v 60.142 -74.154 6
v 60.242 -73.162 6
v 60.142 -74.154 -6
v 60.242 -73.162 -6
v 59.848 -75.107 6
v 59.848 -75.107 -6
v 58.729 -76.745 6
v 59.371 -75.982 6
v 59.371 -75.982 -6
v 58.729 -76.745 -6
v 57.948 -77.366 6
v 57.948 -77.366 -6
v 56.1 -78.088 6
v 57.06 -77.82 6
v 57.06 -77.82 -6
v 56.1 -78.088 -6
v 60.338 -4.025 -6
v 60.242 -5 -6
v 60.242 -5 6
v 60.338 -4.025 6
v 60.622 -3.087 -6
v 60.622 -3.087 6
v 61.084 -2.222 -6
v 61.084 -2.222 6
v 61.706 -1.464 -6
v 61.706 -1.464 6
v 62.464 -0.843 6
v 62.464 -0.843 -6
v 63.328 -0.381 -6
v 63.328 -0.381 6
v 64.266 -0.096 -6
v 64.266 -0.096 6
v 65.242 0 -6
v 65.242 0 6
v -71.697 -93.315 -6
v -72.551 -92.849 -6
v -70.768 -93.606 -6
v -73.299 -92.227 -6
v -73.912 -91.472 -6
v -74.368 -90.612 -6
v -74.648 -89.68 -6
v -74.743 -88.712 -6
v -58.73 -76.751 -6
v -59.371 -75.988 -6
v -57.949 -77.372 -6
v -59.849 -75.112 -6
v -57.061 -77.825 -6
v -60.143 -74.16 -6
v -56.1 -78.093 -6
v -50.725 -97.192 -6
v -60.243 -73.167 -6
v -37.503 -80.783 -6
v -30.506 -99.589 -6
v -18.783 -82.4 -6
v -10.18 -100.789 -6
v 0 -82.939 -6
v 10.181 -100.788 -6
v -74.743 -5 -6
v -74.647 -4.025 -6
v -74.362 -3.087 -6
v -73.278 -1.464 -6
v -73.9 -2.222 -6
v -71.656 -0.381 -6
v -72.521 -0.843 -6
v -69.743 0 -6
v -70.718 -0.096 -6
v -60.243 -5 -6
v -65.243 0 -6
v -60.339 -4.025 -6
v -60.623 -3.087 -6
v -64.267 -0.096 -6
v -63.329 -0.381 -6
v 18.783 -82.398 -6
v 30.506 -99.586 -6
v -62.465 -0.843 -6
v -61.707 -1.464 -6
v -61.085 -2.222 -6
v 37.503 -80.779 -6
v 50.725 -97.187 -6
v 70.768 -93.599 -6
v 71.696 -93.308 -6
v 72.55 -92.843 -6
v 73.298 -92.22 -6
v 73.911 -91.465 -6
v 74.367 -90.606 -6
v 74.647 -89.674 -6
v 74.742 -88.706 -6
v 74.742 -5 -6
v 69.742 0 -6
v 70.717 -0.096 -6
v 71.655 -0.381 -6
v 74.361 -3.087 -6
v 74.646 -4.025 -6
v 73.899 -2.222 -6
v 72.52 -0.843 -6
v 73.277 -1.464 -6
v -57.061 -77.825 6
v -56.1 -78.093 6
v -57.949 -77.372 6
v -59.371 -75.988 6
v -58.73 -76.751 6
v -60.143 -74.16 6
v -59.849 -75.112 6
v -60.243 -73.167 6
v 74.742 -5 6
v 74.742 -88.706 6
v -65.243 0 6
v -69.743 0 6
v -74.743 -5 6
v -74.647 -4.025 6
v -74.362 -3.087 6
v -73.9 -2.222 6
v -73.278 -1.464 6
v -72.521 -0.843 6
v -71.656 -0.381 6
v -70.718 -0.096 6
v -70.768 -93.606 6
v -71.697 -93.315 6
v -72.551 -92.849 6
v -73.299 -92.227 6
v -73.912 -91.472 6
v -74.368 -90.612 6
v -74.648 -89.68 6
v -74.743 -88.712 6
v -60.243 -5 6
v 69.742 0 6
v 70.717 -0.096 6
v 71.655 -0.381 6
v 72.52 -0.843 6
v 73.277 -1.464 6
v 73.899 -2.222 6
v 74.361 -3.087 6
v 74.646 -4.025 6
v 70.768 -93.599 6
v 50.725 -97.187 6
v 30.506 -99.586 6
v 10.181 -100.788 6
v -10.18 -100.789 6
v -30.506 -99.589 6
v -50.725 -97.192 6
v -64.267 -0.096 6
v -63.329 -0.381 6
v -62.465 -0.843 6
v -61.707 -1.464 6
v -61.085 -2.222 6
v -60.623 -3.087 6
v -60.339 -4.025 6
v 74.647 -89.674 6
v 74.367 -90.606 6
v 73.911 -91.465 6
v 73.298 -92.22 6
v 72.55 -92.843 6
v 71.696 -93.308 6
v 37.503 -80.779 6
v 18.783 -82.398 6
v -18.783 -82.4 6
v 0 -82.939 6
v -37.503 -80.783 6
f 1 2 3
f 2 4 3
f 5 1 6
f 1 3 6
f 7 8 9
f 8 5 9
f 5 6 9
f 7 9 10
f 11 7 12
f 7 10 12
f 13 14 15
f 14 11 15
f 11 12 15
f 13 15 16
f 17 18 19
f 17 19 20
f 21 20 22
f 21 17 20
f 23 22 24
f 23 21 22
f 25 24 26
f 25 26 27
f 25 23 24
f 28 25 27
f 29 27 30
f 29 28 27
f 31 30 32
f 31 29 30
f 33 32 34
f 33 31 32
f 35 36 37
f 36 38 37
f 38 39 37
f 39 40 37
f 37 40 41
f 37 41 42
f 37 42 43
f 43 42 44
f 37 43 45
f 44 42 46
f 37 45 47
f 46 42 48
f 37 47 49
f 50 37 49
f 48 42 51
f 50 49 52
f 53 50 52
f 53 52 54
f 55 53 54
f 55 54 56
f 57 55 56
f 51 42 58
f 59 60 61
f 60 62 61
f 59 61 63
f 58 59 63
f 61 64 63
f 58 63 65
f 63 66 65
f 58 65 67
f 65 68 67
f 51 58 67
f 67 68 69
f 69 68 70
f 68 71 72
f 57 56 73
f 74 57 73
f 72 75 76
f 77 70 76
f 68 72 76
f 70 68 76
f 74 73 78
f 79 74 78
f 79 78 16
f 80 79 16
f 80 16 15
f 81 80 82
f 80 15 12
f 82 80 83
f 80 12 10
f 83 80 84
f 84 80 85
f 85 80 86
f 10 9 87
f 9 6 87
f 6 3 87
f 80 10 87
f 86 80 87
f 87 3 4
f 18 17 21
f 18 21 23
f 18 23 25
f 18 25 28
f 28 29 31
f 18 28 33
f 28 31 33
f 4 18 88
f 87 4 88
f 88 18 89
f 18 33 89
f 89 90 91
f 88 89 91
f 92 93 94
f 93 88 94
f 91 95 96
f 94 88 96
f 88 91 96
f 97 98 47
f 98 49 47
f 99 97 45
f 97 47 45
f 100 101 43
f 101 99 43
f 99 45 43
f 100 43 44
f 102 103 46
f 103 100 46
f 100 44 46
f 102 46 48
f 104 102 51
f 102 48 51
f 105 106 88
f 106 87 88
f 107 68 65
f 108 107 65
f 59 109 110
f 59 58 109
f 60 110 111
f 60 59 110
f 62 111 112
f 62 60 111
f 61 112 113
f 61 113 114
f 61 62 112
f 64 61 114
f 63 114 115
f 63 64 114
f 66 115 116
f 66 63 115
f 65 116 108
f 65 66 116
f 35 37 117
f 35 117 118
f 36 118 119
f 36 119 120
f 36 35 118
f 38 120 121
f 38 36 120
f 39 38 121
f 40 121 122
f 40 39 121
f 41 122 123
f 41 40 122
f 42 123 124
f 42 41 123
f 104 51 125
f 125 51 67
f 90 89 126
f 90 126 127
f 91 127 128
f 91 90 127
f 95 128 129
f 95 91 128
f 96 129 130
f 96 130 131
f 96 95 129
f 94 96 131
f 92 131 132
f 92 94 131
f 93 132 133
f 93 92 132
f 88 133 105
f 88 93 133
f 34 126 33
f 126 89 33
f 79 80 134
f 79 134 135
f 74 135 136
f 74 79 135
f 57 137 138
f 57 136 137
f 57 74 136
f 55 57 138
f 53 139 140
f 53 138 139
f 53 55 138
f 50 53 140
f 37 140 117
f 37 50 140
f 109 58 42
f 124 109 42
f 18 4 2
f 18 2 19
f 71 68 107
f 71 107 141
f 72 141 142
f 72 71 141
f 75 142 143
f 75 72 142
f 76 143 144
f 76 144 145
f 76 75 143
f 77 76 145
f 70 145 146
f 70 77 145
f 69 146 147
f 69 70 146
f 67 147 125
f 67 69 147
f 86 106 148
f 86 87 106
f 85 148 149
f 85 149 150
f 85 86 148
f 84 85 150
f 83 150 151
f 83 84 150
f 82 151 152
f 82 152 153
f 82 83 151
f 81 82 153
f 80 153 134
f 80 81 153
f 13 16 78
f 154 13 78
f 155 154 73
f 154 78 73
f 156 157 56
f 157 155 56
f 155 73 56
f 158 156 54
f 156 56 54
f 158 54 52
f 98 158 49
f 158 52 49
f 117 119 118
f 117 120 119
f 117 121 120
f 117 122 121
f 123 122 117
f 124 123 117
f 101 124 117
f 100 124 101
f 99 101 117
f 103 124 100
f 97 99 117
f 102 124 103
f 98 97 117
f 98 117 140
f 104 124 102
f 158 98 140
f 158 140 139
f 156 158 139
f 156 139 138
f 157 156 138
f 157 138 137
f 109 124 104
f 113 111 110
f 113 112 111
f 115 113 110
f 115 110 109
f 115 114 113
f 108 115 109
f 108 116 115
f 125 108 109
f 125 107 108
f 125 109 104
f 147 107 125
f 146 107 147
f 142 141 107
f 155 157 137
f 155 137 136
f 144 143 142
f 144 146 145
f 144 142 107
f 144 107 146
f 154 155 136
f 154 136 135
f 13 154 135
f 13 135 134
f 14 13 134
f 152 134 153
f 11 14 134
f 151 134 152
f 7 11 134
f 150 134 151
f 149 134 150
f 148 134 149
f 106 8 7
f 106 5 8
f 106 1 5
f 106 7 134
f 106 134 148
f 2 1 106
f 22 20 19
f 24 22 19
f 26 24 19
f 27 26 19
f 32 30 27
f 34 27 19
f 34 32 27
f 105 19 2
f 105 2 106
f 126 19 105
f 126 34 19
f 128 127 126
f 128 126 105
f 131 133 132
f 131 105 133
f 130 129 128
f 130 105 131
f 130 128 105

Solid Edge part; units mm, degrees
sketch "Sketch1" plane through (0, 0, 0) normal (0, 0, 1) x (1, 0, 0)
  line L0 (-74.7428, -5) -> (-74.7428, -88.7121)
  arc A0 (-70.7682, -93.6058) -> (-74.7428, -88.7121) centre (-69.7428, -88.7121) cw
  arc A1 (-70.7682, -93.6058) -> (70.7677, -93.5993) centre (-0.0157, 244.0613) ccw
  arc A2 (74.7418, -88.7058) -> (70.7677, -93.5994) centre (69.7418, -88.7058) cw
  line L1 (74.7418, -88.7058) -> (74.7418, -5)
  arc A3 (69.7418, 0) -> (74.7418, -5) centre (69.7418, -5) cw
  line L2 (69.7418, 0) -> (65.2418, 0)
  arc A4 (60.2418, -5) -> (65.2418, 0) centre (65.2418, -5) cw
  line L3 (60.2418, -73.162) -> (60.2418, -5)
  arc A5 (56.0999, -78.0878) -> (60.2418, -73.162) centre (55.2418, -73.162) ccw
  arc A6 (-56.1003, -78.0932) -> (56.0999, -78.0878) centre (-0.0157, 244.0613) ccw
  arc A7 (-60.2428, -73.1673) -> (-56.1003, -78.0932) centre (-55.2428, -73.1673) ccw
  line L4 (-60.2428, -73.1673) -> (-60.2428, -5)
  arc A8 (-65.2428, 0) -> (-60.2428, -5) centre (-65.2428, -5) cw
  line L5 (-65.2428, 0) -> (-69.7428, 0)
  arc A9 (-74.7428, -5) -> (-69.7428, 0) centre (-69.7428, -5) cw
extrude "Protrusion1" add sketch "Sketch1" along normal mid plane 12
properties part number "2003-004" material "Plastic"
